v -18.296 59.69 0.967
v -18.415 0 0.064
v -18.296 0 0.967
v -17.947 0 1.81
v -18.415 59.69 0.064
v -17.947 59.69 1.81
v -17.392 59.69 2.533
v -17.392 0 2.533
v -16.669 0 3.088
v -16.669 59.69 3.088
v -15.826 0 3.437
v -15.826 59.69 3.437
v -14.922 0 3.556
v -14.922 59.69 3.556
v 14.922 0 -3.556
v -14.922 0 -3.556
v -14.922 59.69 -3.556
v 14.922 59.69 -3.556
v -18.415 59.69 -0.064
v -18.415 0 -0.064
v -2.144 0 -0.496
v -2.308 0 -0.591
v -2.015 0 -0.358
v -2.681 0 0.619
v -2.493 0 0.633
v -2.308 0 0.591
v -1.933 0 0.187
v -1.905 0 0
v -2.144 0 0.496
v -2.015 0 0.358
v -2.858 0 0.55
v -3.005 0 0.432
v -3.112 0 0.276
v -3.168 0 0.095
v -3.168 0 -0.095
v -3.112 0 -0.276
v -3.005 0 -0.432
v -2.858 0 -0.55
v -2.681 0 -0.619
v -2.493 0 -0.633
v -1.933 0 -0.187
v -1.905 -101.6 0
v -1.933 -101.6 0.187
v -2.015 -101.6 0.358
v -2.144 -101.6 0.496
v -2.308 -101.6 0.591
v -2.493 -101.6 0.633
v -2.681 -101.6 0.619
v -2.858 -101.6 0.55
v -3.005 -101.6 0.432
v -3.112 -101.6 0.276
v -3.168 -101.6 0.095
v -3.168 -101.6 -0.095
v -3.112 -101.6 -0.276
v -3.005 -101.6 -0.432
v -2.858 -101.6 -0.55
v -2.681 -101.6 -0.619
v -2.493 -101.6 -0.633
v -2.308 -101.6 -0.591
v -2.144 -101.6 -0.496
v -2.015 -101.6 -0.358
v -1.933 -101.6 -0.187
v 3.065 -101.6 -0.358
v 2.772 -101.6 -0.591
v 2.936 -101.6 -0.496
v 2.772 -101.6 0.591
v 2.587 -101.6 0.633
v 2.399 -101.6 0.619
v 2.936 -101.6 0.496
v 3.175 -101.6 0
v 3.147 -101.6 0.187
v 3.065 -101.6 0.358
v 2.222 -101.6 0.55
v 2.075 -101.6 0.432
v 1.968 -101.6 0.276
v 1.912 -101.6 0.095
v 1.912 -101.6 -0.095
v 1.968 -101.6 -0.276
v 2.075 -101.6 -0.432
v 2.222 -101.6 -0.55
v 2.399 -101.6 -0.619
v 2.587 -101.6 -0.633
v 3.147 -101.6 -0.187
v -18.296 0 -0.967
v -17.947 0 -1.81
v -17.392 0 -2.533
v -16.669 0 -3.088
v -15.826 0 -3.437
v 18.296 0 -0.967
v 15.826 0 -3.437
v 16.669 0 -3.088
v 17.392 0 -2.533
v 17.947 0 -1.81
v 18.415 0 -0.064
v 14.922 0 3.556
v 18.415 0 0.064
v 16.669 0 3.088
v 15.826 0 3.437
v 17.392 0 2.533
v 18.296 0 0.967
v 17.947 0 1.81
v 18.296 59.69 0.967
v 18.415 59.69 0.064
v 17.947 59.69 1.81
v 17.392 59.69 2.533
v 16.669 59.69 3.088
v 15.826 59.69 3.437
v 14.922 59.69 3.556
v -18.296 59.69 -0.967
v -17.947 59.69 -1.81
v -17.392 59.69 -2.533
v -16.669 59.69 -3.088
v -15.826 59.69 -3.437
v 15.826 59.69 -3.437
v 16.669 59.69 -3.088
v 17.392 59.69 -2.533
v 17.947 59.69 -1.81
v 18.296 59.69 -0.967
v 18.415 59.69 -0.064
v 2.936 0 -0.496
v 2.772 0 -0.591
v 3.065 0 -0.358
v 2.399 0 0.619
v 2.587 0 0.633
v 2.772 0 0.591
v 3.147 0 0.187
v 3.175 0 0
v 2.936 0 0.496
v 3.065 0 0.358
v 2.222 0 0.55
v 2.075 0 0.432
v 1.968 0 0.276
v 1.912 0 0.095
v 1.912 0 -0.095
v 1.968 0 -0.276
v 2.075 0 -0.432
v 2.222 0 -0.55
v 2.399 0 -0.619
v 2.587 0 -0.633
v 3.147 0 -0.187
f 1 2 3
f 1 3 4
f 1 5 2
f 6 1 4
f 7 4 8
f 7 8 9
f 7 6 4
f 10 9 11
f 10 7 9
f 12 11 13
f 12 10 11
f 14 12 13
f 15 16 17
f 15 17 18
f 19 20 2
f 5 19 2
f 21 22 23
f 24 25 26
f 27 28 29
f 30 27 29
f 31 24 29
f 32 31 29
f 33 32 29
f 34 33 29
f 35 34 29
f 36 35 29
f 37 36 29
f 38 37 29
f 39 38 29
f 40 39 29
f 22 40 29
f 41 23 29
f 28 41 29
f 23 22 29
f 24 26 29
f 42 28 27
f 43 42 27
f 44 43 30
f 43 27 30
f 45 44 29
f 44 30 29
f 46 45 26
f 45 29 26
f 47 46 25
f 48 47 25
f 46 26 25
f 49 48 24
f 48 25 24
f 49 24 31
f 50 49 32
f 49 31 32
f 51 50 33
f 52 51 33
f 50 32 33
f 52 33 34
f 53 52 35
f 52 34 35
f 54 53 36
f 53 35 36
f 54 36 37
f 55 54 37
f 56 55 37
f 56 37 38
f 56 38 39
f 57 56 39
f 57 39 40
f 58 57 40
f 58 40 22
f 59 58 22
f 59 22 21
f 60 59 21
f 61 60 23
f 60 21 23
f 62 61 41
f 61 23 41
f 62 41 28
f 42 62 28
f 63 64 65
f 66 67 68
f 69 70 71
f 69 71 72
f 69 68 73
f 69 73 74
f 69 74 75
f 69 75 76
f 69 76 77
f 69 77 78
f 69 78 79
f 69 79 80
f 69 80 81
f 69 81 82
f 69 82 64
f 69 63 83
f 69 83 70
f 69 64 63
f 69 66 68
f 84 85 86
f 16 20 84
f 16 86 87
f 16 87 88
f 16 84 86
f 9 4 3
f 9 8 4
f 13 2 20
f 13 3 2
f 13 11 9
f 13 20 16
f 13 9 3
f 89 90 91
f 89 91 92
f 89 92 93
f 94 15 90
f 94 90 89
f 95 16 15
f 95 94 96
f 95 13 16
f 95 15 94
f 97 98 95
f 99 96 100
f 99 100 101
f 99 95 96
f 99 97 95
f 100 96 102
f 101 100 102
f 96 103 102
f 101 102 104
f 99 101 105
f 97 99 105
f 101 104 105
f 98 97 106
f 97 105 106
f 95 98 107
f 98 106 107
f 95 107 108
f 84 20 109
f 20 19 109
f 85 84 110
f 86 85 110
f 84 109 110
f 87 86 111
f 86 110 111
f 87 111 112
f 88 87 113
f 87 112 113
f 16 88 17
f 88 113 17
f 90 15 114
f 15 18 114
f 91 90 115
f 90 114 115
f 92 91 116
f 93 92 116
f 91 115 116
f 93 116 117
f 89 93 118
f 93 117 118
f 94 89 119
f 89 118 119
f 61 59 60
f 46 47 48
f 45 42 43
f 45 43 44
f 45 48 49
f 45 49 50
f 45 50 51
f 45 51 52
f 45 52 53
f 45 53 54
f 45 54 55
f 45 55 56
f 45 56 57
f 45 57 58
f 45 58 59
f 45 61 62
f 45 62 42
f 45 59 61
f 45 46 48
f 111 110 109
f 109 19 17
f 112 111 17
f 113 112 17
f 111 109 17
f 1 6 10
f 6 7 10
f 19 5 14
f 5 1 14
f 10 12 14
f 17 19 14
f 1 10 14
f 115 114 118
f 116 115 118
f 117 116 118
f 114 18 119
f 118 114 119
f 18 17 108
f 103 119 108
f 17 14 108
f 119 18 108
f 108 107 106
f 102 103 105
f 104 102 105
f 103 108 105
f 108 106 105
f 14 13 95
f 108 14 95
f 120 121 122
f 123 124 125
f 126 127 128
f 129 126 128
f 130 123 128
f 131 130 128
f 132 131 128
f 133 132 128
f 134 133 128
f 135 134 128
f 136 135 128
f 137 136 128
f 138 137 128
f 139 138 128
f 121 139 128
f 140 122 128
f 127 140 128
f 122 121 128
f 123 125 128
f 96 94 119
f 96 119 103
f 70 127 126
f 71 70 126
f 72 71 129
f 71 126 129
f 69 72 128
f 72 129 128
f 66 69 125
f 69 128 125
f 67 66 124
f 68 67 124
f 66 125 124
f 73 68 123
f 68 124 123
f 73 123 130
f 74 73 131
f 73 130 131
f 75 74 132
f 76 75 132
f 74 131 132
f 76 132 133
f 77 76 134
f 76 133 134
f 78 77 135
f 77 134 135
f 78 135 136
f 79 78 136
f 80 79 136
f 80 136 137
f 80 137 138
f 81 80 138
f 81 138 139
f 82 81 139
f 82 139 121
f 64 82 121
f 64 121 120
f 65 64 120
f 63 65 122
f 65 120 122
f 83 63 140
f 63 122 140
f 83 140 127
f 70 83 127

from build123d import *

# Parameters (mm, degrees)
F0_W     = 36.83
F0_H     = 7.112
F1_DEPTH = 59.69
F2_R     = 0.635
F3_DEPTH = 101.6
F4_DEPTH = 101.6
F5_R     = 3.4925


with BuildPart() as f1:
    # F0 (on Front) → F1 (new body)
    with BuildSketch(Plane.XZ):
        Rectangle(F0_W, F0_H)
    extrude(amount=-F1_DEPTH)

    # F5
    f5_edges = [f1.edges().sort_by_distance(p)[0] for p in [
        (-18.415, 29.845, 3.556),
        (-18.415, 29.845, -3.556),
        (18.415, 29.845, 3.556),
        (18.415, 29.845, -3.556),
    ]]
    fillet(f5_edges, radius=F5_R)


with BuildPart() as f3:
    # F2 (on face) → F3 (new body)
    with BuildSketch(Plane.XZ):
        with Locations((2.54, 0)):
            Circle(F2_R)
    extrude(amount=F3_DEPTH)


with BuildPart() as f4:
    # F2 (on face) → F4 (new body)
    with BuildSketch(Plane.XZ):
        with Locations((-2.54, 0)):
            Circle(F2_R)
    extrude(amount=F4_DEPTH)


solid = Compound([f1.part, f3.part, f4.part])
